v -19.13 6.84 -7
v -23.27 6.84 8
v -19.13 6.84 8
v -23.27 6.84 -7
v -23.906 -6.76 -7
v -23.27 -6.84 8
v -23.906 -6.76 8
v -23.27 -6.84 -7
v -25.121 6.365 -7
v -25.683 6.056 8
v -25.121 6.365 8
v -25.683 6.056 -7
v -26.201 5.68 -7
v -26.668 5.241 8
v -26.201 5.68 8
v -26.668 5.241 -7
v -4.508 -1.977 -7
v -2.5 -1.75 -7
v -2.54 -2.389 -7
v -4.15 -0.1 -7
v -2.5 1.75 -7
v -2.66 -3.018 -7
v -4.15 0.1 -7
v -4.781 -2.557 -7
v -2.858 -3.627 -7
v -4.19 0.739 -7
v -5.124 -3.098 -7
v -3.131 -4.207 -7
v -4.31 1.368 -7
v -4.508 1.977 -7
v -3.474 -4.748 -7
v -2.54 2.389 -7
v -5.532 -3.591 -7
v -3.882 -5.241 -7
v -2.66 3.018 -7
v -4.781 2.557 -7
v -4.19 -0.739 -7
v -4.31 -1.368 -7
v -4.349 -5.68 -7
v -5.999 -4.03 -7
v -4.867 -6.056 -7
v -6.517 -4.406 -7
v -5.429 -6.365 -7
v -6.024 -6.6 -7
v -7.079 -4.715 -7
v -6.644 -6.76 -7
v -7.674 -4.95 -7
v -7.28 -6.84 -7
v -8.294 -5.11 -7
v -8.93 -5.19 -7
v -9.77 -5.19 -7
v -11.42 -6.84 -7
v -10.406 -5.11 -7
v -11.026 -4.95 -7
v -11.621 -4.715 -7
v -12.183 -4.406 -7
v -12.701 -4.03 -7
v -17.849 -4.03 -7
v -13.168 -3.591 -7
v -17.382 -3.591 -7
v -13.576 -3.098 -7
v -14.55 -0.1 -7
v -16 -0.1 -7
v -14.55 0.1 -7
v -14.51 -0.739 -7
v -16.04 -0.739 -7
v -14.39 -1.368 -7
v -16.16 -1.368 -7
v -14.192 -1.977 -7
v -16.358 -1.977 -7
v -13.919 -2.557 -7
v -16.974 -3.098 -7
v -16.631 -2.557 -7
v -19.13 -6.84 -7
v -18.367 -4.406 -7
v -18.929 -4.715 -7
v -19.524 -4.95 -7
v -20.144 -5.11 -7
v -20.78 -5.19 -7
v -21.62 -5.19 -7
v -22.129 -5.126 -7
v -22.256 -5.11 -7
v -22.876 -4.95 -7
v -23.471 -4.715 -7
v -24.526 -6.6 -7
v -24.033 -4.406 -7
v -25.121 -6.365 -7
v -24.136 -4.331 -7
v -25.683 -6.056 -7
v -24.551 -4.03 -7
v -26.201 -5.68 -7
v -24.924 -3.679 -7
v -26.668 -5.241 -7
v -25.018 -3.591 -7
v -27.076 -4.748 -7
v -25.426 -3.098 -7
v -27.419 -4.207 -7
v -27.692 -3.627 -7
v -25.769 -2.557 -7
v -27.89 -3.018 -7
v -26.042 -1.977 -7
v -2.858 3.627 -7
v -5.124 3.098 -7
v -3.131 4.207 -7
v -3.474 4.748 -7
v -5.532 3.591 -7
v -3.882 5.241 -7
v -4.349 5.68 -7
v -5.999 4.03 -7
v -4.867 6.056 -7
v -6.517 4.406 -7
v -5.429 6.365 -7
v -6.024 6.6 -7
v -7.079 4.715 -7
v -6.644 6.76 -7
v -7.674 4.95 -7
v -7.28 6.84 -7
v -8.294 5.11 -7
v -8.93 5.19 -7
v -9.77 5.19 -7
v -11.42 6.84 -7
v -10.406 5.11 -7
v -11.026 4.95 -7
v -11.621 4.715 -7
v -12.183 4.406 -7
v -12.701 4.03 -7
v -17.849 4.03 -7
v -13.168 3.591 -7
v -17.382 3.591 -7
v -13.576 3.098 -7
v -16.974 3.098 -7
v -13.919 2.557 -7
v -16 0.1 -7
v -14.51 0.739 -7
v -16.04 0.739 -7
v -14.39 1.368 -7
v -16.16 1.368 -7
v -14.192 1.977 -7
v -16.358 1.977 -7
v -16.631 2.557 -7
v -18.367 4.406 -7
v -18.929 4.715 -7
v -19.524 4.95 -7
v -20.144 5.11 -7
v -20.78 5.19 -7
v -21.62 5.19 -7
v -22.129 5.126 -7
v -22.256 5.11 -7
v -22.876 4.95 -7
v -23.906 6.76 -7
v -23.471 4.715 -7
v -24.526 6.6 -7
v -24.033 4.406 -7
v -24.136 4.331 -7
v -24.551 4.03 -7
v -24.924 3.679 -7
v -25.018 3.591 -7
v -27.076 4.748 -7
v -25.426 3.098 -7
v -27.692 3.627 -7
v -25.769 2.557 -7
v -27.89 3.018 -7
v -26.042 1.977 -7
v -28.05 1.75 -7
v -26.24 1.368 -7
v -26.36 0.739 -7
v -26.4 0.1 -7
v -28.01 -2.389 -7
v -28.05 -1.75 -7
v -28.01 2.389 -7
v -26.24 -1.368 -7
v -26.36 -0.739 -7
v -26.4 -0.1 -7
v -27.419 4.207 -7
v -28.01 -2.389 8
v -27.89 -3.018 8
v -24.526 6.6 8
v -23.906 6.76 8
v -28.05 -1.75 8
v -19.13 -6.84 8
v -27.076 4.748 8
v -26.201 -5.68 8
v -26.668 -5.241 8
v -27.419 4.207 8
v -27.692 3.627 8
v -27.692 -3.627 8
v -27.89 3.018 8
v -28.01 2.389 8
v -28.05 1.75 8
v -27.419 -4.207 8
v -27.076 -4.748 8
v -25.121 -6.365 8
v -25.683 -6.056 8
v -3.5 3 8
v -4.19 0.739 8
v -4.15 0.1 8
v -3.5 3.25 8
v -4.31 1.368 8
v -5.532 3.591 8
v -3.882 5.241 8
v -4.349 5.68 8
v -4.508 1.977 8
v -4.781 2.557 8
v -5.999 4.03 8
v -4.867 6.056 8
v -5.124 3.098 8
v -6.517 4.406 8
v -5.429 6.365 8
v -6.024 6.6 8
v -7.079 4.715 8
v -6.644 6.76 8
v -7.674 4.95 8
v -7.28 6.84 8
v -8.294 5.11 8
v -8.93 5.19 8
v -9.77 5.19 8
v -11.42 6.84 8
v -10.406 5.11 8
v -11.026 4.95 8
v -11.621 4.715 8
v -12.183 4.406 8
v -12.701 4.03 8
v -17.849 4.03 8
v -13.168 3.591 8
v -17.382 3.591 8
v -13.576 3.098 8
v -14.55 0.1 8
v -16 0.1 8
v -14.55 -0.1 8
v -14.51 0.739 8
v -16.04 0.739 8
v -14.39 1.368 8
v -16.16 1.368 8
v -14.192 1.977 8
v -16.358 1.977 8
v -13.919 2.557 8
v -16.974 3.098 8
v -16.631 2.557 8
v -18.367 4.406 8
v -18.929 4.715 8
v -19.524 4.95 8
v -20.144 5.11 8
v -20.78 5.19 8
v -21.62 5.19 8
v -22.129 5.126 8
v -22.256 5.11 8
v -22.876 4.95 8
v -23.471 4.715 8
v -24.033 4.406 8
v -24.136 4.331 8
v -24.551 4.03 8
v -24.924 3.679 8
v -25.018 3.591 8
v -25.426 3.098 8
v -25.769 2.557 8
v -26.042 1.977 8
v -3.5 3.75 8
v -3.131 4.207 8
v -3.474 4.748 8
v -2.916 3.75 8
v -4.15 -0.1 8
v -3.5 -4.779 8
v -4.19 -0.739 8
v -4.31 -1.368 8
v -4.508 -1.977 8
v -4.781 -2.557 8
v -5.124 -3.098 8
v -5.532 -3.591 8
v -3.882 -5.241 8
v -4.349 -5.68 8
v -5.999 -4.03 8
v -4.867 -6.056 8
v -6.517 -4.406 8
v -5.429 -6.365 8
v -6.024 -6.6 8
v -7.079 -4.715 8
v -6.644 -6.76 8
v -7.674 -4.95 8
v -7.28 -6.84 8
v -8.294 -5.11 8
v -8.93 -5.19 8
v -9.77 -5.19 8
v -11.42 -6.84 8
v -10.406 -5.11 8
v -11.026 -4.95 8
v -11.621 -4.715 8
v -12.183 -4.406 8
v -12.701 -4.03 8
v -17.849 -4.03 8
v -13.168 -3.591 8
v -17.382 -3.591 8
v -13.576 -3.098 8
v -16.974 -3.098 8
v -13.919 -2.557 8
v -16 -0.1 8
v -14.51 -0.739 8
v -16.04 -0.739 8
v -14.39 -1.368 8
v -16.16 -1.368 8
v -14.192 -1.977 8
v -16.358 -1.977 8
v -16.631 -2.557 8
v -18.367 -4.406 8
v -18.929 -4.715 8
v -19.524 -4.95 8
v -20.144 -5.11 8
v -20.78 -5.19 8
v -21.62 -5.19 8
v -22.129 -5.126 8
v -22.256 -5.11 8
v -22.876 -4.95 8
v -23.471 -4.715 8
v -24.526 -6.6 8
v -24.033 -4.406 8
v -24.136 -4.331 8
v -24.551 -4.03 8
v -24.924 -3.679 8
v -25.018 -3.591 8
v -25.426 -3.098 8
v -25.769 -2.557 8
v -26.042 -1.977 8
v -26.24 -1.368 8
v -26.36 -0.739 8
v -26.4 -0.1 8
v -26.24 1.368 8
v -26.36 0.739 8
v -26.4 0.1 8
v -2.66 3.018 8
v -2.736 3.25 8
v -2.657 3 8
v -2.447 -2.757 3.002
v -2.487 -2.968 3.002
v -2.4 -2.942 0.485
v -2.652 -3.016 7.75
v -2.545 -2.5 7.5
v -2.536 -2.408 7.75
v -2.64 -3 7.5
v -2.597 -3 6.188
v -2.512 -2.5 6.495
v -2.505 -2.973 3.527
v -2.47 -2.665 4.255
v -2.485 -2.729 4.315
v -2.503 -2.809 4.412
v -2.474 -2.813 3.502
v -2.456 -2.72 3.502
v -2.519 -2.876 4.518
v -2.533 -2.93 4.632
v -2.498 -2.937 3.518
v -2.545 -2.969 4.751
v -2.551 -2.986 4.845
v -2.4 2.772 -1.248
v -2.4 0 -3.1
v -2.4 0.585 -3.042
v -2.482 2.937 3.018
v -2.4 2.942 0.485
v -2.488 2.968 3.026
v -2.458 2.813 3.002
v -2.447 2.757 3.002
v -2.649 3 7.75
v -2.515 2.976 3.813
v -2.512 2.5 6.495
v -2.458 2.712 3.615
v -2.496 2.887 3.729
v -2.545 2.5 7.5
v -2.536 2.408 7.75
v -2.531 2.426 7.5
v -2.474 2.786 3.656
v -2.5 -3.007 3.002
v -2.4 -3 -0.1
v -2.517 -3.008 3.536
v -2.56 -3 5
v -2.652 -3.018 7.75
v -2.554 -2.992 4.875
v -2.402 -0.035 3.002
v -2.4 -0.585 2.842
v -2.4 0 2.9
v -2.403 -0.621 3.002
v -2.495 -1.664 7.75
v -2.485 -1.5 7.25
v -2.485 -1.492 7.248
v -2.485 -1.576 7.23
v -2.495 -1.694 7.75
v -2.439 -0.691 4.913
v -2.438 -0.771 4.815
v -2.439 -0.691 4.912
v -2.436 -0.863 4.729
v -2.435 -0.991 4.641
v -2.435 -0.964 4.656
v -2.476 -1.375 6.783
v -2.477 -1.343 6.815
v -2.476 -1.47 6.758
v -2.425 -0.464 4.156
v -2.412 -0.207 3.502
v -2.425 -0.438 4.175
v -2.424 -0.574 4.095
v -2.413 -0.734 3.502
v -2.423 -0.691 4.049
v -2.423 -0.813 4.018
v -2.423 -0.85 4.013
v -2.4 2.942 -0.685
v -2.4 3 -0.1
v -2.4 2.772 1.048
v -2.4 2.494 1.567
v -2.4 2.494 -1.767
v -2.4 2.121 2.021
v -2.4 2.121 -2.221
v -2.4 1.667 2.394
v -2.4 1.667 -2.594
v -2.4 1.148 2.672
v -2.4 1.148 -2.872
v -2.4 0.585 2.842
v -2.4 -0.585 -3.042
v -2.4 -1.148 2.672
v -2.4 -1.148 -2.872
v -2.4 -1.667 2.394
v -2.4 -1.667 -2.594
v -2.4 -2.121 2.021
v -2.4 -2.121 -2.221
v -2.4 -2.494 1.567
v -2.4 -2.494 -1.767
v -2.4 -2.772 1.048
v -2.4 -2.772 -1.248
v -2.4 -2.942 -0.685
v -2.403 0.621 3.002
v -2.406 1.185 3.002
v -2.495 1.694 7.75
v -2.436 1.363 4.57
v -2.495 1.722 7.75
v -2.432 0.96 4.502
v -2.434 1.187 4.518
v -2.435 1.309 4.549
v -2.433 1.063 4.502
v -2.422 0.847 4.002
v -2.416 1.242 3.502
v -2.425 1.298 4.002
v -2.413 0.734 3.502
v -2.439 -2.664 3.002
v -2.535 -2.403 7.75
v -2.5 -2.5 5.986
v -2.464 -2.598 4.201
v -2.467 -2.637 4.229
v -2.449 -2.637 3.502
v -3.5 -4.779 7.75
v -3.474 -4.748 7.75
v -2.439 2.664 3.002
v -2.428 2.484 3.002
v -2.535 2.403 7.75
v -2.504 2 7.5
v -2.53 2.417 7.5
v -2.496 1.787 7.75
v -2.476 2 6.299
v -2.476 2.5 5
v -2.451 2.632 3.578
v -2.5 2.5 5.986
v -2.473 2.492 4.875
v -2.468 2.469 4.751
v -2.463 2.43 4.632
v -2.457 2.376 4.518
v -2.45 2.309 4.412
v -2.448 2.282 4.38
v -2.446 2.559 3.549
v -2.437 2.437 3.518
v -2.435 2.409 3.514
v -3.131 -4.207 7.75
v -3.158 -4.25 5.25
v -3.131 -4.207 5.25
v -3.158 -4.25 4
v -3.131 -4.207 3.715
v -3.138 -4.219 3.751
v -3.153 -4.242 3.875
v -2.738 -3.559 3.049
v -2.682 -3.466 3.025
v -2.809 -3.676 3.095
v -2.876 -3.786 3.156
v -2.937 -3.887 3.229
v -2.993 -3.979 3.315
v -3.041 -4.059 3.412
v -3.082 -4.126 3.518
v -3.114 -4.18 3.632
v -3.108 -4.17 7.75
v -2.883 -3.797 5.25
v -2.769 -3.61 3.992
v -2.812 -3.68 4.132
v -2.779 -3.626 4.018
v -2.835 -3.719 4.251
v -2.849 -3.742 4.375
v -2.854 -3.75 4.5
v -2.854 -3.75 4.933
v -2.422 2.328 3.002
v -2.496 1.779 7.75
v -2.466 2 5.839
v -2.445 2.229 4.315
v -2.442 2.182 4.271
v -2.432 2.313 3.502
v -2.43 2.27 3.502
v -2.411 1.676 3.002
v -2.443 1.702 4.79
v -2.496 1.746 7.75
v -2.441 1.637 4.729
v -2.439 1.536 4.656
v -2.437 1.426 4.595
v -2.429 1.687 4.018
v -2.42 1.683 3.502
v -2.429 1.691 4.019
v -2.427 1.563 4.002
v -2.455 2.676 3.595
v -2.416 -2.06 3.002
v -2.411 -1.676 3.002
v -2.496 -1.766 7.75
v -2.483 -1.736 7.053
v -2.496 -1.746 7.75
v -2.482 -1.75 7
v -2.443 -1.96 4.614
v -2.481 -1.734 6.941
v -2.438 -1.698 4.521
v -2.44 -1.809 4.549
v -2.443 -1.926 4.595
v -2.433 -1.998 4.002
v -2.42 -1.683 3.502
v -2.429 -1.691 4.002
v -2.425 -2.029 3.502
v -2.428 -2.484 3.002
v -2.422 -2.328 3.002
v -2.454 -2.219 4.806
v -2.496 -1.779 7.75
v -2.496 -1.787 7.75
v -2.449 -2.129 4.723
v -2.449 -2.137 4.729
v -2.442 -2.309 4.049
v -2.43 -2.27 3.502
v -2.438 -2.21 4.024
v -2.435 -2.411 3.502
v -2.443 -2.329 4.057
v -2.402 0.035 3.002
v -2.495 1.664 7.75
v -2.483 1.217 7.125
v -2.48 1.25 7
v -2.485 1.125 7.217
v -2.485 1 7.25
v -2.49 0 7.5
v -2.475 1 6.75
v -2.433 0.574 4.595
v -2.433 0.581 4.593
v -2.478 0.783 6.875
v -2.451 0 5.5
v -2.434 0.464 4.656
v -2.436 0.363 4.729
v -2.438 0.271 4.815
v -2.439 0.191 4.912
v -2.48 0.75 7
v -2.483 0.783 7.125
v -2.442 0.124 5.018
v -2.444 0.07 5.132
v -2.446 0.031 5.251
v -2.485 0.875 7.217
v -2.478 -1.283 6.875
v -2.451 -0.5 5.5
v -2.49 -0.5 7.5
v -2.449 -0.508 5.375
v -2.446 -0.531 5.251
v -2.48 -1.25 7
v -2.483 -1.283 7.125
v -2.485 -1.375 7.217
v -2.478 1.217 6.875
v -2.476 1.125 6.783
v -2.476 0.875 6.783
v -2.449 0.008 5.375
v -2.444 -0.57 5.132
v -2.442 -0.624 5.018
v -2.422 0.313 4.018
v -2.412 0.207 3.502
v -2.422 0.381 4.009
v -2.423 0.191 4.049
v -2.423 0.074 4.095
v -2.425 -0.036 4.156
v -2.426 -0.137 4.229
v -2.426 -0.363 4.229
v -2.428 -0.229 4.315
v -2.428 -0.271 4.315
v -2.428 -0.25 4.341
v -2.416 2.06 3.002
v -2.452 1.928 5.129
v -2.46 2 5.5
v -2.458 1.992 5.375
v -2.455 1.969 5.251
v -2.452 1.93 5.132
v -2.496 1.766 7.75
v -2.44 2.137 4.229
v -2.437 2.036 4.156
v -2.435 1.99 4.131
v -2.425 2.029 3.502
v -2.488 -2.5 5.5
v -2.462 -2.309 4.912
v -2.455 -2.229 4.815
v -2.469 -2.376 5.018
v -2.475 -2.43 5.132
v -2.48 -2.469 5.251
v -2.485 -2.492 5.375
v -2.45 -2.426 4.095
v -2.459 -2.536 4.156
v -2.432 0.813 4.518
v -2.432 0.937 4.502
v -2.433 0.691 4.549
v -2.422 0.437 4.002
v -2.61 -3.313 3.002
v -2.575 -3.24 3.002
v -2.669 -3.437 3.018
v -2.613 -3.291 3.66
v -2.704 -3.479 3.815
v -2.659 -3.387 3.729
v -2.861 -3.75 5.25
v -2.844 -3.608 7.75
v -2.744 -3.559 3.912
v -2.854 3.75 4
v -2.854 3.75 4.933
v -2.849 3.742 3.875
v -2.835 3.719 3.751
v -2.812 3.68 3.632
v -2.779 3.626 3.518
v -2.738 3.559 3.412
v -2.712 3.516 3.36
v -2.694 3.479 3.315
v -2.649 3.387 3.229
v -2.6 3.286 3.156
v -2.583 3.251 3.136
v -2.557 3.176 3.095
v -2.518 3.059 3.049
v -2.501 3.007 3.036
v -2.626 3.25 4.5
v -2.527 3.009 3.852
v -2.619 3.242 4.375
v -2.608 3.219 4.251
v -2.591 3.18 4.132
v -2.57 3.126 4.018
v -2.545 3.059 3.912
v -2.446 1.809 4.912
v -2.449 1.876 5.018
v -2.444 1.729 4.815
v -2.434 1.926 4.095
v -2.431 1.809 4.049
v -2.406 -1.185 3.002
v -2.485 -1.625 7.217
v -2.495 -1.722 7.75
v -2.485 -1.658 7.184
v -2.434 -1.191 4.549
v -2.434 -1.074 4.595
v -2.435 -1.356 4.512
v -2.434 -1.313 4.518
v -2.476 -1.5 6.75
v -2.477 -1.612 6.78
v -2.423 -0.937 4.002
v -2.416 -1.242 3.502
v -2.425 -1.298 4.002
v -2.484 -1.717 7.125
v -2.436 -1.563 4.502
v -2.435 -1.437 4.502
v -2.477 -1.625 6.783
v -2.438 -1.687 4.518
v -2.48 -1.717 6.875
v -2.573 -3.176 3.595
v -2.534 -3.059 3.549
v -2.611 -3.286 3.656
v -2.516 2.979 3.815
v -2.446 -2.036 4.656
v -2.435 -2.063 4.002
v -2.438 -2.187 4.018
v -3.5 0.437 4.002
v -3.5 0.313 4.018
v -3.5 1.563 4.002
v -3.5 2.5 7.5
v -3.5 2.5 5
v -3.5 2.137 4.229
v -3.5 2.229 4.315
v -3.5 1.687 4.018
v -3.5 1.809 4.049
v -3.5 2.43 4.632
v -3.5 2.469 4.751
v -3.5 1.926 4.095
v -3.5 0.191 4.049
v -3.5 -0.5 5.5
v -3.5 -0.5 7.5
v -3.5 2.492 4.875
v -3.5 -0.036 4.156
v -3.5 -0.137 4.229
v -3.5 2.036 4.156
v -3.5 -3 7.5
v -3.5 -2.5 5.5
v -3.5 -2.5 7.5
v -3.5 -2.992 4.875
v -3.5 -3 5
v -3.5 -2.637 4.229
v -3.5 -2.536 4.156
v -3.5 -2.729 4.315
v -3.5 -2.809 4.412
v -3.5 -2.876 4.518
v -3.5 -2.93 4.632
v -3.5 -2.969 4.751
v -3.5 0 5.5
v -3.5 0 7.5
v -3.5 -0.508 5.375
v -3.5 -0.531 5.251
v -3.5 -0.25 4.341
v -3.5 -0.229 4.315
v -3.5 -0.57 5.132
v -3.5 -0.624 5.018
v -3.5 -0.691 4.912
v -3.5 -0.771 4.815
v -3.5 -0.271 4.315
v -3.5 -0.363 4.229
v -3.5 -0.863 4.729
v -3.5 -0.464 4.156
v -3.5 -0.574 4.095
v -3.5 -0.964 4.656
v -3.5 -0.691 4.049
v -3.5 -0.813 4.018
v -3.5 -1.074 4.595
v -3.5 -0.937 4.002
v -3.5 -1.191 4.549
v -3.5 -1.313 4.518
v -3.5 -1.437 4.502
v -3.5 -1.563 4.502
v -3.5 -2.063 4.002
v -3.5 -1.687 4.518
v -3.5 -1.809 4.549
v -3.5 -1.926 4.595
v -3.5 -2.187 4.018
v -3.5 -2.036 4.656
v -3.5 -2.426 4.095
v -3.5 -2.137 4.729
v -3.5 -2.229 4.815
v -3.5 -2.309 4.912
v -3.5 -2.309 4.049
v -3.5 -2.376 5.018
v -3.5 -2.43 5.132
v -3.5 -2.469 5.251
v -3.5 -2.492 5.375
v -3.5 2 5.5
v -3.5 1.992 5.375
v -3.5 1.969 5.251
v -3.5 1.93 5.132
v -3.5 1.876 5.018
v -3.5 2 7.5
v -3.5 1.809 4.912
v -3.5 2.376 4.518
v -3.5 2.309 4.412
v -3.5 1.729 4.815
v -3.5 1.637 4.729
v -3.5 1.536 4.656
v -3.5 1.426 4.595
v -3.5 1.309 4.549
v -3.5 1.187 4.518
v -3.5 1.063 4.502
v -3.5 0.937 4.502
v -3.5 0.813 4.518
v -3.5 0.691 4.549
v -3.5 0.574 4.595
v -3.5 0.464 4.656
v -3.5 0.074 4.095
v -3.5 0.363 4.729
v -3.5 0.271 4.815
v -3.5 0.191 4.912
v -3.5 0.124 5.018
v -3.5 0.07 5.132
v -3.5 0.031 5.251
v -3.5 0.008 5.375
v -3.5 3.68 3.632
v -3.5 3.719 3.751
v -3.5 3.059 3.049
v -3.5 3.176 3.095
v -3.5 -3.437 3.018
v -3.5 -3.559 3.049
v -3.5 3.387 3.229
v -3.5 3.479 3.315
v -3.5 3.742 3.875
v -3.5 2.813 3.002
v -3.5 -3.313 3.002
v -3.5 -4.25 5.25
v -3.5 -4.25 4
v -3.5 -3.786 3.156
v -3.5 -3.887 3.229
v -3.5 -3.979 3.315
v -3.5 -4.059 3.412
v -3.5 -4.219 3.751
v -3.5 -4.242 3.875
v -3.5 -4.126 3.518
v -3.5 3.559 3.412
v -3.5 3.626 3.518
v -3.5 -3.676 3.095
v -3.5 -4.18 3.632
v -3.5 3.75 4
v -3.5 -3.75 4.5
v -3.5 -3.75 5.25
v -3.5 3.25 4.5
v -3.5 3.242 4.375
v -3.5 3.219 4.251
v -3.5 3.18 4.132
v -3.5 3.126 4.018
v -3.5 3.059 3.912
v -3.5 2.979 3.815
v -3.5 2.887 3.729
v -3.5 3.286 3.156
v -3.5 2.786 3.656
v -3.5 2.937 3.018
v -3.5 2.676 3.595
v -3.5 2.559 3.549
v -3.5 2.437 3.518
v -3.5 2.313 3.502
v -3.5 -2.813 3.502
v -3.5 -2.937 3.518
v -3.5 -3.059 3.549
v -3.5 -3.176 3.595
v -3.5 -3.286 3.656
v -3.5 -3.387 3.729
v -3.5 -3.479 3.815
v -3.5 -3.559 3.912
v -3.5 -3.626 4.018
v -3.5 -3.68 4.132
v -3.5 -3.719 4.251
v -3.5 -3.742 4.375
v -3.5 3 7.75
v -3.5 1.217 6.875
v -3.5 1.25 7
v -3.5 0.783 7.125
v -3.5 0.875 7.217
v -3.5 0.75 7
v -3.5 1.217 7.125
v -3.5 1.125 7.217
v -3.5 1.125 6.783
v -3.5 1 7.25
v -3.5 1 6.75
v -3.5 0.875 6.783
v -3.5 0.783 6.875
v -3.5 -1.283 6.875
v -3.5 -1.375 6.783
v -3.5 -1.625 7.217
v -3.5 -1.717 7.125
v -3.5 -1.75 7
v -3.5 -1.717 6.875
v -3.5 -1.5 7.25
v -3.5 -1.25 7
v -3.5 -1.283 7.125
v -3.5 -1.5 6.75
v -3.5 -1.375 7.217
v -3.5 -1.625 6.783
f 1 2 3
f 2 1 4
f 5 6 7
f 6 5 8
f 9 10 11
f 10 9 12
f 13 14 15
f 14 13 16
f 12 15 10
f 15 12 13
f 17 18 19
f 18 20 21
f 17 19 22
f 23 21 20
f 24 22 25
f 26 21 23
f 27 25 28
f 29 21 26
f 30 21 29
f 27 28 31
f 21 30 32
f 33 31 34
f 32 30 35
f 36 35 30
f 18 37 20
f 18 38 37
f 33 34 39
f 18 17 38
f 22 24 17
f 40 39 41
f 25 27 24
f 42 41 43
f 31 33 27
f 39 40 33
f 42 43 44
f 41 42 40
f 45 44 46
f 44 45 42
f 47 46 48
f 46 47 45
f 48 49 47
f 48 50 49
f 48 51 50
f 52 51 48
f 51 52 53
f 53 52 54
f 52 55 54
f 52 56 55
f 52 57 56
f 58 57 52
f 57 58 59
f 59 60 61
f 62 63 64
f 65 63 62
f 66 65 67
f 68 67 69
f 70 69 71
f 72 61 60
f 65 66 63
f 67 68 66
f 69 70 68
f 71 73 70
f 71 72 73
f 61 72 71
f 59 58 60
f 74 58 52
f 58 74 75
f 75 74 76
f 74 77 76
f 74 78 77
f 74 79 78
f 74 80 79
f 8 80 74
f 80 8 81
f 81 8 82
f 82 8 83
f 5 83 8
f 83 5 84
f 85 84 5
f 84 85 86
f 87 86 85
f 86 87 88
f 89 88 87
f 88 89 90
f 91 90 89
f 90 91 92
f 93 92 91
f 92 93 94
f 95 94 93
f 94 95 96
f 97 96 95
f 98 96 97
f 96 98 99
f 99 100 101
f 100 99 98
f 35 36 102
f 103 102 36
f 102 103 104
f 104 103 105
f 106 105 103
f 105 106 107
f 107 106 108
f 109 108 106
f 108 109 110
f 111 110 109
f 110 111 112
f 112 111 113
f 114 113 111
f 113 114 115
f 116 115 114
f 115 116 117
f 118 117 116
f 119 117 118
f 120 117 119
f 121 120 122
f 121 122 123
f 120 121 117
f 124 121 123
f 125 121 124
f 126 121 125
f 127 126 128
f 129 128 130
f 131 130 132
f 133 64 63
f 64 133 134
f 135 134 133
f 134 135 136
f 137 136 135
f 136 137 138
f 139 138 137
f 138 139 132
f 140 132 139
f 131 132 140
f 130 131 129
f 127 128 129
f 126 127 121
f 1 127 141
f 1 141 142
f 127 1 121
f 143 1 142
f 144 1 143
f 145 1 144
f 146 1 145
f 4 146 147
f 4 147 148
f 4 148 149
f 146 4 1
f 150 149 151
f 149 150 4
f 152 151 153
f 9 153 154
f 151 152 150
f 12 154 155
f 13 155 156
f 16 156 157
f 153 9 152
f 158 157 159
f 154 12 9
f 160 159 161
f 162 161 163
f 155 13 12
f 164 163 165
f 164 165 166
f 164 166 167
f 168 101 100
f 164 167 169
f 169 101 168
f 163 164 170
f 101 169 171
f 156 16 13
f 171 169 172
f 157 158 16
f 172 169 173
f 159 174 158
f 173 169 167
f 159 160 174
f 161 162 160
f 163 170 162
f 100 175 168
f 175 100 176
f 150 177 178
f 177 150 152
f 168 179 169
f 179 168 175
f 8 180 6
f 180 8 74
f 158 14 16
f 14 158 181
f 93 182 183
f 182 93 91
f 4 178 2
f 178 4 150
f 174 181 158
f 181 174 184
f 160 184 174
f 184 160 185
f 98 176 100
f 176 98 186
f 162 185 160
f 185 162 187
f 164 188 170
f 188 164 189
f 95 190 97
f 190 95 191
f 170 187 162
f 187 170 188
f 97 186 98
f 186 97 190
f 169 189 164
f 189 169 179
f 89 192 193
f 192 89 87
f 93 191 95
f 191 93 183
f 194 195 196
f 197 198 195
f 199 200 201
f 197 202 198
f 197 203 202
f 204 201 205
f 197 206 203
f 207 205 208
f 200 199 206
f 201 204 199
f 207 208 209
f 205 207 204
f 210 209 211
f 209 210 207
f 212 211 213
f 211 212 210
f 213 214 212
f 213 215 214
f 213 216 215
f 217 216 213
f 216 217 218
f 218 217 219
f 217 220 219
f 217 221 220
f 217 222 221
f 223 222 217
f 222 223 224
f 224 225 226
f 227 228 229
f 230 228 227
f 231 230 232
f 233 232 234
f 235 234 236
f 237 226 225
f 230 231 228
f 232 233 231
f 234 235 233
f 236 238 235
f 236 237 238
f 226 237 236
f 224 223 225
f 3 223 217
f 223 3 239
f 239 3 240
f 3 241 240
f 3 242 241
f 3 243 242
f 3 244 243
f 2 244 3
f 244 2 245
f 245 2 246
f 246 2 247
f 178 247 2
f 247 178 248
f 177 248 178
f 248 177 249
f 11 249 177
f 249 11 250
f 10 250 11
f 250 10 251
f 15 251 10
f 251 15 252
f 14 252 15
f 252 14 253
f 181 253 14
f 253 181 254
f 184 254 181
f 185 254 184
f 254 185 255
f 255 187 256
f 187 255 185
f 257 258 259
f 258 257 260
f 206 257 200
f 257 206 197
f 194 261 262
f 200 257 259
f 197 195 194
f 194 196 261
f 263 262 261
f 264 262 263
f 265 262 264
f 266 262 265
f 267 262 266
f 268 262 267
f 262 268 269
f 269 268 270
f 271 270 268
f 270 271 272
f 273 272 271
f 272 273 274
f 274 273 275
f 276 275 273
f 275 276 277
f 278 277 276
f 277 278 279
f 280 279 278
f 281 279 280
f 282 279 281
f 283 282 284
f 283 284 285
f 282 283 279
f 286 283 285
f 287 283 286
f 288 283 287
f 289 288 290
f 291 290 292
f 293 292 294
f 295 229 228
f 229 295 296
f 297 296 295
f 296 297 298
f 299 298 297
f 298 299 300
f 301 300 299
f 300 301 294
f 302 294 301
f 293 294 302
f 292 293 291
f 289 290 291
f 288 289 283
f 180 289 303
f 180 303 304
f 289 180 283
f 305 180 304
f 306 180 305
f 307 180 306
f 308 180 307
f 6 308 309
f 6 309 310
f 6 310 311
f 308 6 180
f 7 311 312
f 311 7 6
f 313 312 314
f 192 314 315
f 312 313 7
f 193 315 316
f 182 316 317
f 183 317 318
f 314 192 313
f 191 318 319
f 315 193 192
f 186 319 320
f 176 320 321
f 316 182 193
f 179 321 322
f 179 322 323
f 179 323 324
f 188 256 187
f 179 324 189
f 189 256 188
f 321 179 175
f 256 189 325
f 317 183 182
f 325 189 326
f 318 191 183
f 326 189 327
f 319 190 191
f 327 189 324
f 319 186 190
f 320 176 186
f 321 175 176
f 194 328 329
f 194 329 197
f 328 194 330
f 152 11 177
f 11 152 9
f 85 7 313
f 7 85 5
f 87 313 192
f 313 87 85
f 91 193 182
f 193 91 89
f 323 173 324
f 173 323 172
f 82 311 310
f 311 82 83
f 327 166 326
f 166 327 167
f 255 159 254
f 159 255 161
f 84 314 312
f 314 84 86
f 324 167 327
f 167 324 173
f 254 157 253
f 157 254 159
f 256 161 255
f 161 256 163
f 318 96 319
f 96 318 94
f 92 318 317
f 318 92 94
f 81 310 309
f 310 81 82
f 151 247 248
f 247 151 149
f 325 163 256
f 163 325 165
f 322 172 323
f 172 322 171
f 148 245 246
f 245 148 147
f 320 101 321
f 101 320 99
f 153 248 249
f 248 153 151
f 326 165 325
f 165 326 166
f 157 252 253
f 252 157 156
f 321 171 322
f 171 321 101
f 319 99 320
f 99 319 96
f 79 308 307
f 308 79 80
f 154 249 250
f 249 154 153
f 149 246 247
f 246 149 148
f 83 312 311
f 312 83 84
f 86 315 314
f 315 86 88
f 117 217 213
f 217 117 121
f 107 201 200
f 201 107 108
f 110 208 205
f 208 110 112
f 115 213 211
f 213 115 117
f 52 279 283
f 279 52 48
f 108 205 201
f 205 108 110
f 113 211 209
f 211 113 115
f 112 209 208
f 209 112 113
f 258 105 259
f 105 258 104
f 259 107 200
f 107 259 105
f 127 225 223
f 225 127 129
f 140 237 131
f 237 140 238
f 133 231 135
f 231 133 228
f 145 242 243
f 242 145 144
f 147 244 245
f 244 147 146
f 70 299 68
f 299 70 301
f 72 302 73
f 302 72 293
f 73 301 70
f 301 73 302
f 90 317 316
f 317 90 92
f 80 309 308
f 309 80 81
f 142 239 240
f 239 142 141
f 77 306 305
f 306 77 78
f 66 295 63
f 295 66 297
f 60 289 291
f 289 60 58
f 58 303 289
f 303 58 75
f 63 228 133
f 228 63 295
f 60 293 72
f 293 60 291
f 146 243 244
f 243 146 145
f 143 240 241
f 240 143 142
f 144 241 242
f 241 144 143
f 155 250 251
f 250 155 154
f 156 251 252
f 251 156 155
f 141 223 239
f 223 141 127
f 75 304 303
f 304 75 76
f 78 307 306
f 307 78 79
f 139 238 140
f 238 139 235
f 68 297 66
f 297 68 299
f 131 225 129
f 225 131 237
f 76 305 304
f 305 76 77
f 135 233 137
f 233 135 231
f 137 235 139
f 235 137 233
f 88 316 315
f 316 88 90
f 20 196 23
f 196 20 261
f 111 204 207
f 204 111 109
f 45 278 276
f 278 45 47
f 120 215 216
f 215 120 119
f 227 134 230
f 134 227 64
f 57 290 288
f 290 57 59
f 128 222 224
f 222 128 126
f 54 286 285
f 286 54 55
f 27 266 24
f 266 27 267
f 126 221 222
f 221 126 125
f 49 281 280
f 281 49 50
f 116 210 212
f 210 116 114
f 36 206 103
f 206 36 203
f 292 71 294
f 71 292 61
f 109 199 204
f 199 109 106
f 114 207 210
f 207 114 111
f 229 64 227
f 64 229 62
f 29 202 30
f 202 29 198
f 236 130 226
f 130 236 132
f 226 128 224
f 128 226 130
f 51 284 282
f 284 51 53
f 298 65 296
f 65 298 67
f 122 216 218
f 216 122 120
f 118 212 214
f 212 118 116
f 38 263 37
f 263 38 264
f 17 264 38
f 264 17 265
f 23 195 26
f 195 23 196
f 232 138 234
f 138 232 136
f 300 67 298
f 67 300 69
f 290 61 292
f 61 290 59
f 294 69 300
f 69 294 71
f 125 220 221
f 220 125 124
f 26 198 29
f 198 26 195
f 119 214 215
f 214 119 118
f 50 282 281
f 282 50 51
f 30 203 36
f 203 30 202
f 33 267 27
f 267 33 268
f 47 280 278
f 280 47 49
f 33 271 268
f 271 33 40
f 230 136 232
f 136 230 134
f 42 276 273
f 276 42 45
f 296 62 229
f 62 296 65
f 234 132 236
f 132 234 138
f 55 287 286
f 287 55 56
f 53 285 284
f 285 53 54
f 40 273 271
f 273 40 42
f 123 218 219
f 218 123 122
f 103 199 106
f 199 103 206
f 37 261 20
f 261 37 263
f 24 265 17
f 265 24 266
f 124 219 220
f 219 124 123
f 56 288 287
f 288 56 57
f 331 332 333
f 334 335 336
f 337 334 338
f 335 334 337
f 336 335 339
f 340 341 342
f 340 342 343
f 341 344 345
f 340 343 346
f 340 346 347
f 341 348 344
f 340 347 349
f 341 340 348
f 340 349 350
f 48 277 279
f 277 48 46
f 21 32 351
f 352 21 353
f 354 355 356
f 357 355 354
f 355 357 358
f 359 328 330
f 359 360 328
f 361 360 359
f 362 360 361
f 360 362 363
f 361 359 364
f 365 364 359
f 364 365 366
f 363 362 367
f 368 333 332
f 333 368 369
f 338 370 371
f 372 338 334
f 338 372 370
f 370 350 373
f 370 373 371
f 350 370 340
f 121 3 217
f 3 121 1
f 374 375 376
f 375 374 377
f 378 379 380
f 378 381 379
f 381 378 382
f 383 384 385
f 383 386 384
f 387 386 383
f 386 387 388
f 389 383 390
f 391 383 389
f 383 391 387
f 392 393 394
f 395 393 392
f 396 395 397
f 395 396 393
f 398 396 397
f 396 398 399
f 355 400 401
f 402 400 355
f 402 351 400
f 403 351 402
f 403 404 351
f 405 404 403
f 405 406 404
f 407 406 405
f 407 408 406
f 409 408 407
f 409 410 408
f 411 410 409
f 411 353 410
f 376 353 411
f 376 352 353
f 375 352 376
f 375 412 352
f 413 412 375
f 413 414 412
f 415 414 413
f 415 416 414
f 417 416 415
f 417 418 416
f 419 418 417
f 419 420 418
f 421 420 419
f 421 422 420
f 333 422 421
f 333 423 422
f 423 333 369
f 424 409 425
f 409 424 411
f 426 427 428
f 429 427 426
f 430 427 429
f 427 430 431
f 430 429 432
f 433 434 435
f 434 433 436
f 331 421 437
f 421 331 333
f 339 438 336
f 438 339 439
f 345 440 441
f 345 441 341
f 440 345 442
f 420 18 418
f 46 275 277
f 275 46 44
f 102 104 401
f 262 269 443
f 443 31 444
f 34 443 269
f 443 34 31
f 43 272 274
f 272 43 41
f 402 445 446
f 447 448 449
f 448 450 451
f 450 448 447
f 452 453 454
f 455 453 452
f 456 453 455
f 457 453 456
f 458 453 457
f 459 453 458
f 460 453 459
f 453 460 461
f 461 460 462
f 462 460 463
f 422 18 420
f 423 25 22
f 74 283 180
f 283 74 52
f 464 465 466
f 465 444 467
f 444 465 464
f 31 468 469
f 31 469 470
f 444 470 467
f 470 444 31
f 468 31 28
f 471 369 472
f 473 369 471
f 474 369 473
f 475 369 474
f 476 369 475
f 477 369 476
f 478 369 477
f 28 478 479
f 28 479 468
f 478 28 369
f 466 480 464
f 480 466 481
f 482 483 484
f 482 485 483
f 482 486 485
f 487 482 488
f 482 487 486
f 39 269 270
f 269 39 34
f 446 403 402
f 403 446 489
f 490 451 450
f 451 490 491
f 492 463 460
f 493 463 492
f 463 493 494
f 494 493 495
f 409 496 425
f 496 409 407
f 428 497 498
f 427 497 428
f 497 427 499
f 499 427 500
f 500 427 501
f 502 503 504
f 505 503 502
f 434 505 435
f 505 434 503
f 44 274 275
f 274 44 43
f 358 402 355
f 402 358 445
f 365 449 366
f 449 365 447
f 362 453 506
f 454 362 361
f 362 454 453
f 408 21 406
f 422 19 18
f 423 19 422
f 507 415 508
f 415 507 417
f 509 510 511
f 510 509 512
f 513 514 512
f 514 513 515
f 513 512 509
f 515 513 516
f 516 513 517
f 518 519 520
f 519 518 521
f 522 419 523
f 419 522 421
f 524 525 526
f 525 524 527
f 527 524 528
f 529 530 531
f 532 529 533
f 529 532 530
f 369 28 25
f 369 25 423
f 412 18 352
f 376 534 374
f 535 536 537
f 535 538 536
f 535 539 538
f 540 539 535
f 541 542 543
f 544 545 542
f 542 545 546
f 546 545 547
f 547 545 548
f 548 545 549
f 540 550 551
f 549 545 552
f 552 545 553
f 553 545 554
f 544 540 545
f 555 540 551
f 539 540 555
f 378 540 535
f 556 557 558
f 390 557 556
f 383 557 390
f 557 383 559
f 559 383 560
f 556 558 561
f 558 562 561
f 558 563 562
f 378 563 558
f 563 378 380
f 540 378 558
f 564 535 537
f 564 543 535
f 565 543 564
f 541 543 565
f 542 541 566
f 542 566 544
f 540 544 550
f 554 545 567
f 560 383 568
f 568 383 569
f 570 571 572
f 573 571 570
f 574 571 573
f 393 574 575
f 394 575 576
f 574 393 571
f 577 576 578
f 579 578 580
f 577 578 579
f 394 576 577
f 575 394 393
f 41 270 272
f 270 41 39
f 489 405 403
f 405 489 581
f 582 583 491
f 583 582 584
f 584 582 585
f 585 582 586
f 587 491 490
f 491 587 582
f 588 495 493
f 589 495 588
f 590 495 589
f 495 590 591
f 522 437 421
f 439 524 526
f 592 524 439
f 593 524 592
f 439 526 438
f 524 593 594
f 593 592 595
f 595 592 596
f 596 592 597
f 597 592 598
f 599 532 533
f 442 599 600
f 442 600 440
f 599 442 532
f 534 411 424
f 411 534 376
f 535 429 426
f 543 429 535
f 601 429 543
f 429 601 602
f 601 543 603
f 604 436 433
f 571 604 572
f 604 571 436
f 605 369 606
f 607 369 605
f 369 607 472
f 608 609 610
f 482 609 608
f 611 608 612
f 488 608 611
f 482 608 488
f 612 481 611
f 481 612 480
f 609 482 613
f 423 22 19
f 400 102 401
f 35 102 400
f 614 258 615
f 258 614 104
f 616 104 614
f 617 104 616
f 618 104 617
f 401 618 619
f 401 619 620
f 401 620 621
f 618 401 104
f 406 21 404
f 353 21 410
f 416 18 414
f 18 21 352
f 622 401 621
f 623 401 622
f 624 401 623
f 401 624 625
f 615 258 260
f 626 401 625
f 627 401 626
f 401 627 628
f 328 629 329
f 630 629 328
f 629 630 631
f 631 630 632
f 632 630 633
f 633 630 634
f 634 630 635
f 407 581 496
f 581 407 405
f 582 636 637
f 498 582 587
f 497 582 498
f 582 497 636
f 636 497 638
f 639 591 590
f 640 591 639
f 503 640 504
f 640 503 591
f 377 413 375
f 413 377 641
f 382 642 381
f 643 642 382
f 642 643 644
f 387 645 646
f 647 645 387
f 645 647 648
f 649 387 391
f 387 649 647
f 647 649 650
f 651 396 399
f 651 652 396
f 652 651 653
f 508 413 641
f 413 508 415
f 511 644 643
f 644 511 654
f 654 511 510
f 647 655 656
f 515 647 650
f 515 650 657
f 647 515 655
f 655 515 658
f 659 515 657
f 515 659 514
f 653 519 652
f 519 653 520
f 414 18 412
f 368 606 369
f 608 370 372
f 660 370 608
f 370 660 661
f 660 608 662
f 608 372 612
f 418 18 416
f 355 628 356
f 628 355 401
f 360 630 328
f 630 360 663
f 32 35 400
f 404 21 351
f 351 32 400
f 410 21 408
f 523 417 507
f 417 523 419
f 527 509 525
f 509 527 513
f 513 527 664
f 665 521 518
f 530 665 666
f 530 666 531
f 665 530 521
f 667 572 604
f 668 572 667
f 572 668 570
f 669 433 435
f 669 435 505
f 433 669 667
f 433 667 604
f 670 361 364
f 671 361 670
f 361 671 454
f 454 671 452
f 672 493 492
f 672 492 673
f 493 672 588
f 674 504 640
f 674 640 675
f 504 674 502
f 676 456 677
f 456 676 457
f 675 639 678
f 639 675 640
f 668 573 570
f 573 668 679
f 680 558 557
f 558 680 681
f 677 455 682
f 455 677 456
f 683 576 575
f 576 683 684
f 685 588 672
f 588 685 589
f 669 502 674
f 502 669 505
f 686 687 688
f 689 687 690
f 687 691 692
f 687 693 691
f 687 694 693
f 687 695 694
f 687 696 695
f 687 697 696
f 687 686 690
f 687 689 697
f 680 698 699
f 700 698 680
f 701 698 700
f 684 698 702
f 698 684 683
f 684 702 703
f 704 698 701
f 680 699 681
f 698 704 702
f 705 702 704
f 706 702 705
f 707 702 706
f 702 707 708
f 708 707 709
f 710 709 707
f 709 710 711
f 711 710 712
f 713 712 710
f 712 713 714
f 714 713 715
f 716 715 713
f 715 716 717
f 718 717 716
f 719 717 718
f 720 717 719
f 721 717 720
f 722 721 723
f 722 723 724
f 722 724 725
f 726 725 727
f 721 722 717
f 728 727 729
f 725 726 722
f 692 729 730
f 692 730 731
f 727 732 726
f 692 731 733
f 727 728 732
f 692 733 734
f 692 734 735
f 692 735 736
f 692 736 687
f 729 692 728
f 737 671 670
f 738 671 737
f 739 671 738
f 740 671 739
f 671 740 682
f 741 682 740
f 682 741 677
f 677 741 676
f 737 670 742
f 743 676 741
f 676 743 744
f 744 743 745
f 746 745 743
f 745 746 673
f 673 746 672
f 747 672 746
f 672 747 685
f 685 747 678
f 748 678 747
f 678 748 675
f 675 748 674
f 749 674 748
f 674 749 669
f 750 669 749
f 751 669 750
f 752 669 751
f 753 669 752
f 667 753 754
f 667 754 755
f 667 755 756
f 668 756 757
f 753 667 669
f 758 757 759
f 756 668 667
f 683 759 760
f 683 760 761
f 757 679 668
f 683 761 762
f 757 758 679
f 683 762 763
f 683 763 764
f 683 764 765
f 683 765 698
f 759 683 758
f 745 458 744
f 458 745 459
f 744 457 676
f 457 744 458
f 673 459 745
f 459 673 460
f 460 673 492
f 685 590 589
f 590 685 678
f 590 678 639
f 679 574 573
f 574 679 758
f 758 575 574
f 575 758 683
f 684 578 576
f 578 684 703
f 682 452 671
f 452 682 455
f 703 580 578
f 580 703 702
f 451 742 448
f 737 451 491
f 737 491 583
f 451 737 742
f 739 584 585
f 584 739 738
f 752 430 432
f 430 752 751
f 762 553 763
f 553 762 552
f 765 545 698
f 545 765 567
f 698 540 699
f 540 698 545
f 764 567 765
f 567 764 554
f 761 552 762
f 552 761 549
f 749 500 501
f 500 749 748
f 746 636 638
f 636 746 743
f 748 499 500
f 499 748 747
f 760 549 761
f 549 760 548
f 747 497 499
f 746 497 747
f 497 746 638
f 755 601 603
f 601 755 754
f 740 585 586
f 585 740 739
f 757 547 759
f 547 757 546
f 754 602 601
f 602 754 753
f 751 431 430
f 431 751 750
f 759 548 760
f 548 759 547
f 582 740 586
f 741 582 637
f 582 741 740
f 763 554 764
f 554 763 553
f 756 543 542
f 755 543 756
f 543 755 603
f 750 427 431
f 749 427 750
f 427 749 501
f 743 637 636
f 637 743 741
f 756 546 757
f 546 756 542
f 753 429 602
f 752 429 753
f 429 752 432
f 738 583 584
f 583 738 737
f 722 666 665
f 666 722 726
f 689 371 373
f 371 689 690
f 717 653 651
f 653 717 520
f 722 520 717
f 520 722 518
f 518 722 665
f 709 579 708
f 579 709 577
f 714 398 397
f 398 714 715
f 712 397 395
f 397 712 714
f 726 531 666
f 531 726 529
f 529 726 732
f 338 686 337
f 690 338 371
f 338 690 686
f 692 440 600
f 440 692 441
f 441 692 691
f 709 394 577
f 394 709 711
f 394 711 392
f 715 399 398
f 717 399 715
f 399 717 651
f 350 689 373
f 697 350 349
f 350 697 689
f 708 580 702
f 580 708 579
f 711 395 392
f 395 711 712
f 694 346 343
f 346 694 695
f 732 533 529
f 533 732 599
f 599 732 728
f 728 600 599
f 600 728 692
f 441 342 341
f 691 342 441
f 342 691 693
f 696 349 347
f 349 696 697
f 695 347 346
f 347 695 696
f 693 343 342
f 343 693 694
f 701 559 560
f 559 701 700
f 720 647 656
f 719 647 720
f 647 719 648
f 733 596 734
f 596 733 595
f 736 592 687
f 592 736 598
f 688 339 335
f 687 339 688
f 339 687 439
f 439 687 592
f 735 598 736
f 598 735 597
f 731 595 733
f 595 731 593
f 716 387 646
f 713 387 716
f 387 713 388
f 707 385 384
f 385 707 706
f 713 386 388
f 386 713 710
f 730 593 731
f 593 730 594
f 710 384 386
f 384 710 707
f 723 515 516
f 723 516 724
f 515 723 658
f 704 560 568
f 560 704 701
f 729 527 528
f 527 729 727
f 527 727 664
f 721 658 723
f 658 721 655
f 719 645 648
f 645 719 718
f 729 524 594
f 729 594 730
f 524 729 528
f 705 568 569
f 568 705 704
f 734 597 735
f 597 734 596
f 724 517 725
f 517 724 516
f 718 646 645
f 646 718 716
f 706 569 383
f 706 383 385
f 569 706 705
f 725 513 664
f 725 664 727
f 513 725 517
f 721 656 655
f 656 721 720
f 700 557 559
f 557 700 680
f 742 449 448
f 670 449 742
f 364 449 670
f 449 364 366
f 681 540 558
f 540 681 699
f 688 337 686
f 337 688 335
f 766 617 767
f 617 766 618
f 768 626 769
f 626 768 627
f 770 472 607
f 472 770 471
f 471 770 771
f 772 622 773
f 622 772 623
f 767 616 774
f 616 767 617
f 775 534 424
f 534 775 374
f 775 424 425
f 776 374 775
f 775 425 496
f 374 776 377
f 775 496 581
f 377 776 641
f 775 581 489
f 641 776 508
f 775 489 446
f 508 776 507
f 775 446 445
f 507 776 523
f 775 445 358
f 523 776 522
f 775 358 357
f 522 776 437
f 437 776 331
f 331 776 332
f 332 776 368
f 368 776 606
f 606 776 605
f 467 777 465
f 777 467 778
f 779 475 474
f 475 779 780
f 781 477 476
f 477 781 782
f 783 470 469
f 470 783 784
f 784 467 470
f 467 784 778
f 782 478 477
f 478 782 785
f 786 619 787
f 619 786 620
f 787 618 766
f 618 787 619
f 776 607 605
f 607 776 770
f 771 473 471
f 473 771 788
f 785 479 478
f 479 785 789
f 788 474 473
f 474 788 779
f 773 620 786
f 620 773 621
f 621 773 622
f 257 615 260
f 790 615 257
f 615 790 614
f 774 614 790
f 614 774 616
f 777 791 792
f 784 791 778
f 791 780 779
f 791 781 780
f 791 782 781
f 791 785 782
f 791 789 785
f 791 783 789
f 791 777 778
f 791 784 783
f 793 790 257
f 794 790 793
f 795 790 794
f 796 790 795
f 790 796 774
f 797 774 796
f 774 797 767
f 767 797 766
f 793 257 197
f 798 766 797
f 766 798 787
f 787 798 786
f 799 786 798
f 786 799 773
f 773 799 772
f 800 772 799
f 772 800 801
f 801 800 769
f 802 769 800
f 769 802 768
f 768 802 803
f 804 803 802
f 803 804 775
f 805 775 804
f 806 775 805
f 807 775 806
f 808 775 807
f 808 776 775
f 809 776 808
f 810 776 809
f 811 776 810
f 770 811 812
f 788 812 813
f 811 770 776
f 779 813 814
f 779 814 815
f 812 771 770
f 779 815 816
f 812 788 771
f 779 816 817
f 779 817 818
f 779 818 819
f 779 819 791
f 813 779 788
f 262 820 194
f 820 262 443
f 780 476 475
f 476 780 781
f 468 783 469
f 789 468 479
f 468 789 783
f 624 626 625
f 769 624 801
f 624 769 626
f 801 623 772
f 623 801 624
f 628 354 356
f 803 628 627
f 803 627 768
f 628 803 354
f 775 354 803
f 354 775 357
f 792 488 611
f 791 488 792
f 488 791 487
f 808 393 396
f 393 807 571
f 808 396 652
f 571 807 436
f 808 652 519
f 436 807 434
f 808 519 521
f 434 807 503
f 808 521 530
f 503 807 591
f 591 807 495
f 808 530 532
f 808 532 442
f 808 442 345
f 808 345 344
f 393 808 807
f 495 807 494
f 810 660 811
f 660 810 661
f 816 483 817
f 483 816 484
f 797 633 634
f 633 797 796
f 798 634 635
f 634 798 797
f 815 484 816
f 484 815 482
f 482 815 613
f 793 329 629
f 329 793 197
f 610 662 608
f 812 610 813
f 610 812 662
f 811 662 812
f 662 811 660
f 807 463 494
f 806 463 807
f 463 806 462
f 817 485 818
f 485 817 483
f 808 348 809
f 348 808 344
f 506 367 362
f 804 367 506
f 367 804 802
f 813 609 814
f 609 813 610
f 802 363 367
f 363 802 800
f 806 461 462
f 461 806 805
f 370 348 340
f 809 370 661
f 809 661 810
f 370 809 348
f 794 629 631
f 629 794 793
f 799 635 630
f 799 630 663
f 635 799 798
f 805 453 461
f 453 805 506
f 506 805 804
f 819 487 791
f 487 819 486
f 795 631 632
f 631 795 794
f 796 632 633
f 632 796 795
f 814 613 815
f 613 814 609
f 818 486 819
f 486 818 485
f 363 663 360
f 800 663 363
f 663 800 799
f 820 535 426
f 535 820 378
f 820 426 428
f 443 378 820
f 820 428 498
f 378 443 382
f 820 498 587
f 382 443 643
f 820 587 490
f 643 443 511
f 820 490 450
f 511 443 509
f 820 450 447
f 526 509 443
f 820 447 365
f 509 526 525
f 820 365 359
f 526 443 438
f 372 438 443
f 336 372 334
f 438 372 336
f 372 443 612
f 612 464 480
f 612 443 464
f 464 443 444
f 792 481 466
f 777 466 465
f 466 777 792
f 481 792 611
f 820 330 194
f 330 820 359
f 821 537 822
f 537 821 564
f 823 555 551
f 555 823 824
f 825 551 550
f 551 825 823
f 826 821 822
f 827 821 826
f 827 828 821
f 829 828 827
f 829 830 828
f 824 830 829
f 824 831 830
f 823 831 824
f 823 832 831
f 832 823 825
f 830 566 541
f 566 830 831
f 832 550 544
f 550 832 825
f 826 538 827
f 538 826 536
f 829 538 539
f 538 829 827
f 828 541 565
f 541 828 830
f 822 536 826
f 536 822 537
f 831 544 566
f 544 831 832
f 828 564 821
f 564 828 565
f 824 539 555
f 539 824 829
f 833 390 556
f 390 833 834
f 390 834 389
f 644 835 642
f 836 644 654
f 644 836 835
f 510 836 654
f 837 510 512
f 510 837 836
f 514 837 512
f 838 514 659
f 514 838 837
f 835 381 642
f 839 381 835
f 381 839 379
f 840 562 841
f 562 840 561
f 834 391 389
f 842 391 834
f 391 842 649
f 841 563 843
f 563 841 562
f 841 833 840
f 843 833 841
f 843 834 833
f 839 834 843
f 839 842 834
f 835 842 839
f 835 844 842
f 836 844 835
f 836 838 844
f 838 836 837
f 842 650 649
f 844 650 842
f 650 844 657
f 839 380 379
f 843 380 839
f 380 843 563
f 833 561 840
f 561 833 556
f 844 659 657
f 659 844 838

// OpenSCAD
// file: pin.scad
include <base_dimensions.scad>;

module pin(clip)
{
	rotate([0,0,15])
		#cylinder(r=hole_size/2, h=board_thickness*1.5+epsilon, center=true, $fn=12);

	if (clip) {
		//
		rotate([0,0,90])
		intersection() {
			translate([0, 0, hole_size-epsilon])
				cube([hole_size+2*epsilon, clip_height, 2*hole_size], center=true);

			// [-hole_size/2 - 1.95,0, board_thickness/2]
			translate([0, hole_size/2 + 2, board_thickness/2]) 
				rotate([0, 90, 0])
				rotate_extrude(convexity = 5, $fn=20)
				translate([5, 0, 0])
				 circle(r = (hole_size*0.95)/2); 
			
			translate([0, hole_size/2 + 2 - 1.6, board_thickness/2]) 
				rotate([45,0,0])
				translate([0, -0, hole_size*0.6])
					cube([hole_size+2*epsilon, 3*hole_size, hole_size], center=true);
		}
	}
}

module old_pin(clip)
{
	rotate([0,0,15])
	cylinder(r=hole_size/2, h=board_thickness*1.5+epsilon, center=true, $fn=12);

	if (clip) {
		//
		rotate([0,0,90])
		intersection() {
			translate([0, 0, hole_size-epsilon])
				cube([hole_size+2*epsilon, clip_height, 2*hole_size], center=true);

			// [-hole_size/2 - 1.95,0, board_thickness/2]
			translate([0, hole_size/2 + 2, board_thickness/2]) 
				rotate([0, 90, 0])
				rotate_extrude(convexity = 5, $fn=20)
				translate([5, 0, 0])
				 circle(r = (hole_size*0.95)/2); 
			
			translate([0, hole_size/2 + 2 - 1.6, board_thickness/2]) 
				rotate([45,0,0])
				translate([0, -0, hole_size*0.6])
					cube([hole_size+2*epsilon, 3*hole_size, hole_size], center=true);
		}
	}
}

// examples
//pin(true);
//translate([10,0,0]) pin(false);
// file: round_rect_ex.scad
module round_rect_ex(
	x1, y1,
	x2, y2,
	z,
	r1, r2,
	holder_x_size = 10)
{
	$fn = max(50, min(20, holder_x_size*2));
	brim = z/10;

	//rotate([0,0,(holder_sides==6)?30:((holder_sides==4)?45:0)])
	hull() {
        translate([-x1/2 + r1, y1/2 - r1, z/2-brim/2])
            cylinder(r=r1, h=brim,center=true);
        translate([x1/2 - r1, y1/2 - r1, z/2-brim/2])
            cylinder(r=r1, h=brim,center=true);
        translate([-x1/2 + r1, -y1/2 + r1, z/2-brim/2])
            cylinder(r=r1, h=brim,center=true);
        translate([x1/2 - r1, -y1/2 + r1, z/2-brim/2])
            cylinder(r=r1, h=brim,center=true);

        translate([-x2/2 + r2, y2/2 - r2, -z/2+brim/2])
            cylinder(r=r2, h=brim,center=true);
        translate([x2/2 - r2, y2/2 - r2, -z/2+brim/2])
            cylinder(r=r2, h=brim,center=true);
        translate([-x2/2 + r2, -y2/2 + r2, -z/2+brim/2])
            cylinder(r=r2, h=brim,center=true);
        translate([x2/2 - r2, -y2/2 + r2, -z/2+brim/2])
            cylinder(r=r2, h=brim,center=true);

    }
}

// example
//round_rect_ex(
//	10,20,
//	10,20,
//	10,
//	3,5,
//	50);
// file: pinboard_clips.scad
include <pin.scad>;
include <base_dimensions.scad>;

module pinboard_clips(
	holder_total_x,
	holder_height = 15,
	strength_factor =  0.66)
{
	rotate([0,90,0])
	for(i=[0:round(holder_total_x/hole_spacing)]) {
		for(j=[0:max(strength_factor, round(holder_height/hole_spacing))]) {

			translate([
				j*hole_spacing, 
				-hole_spacing*(round(holder_total_x/hole_spacing)/2) + i*hole_spacing, 
				0])
					pin(j==0);
		}
	}
}

/*
// examples
pinboard_clips(13);

translate([15,0,0])
	pinboard_clips(30,50);

translate([-15,0,0])
	pinboard_clips(30,15,3);
*/
// file: holder.scad
include <base_dimensions.scad>;
include <round_rect_ex.scad>;

module holder(
	negative,
	holder_x_size = 10,
	holder_y_size = 10,
	holder_height = 15,
	wall_thickness = 1.85,
	holder_x_count = 1,
	holder_y_count = 2,
	corner_radius = 30,
	taper_ratio = 1.0,
	holder_offset = 0.0,
	closed_bottom = 0.0,
	holder_cutout_side = 0.0,
	holder_angle = 0.0,
	strength_factor =  0.66)
{
	holder_sides = max(50, min(20, holder_x_size*2));
	holder_total_x = wall_thickness + holder_x_count*(wall_thickness+holder_x_size);
	holder_total_y = wall_thickness + holder_y_count*(wall_thickness+holder_y_size);
	//holder_total_z = round(holder_height/hole_spacing)*hole_spacing;
	holder_roundness = min(corner_radius, holder_x_size/2, holder_y_size/2); 

	for(x=[1:holder_x_count]){
		for(y=[1:holder_y_count]) 
/*		render(convexity=2)*/ {
			translate([
				-holder_total_y /*- (holder_y_size+wall_thickness)/2*/ + y*(holder_y_size+wall_thickness) + wall_thickness,

				-holder_total_x/2 + (holder_x_size+wall_thickness)/2 + (x-1)*(holder_x_size+wall_thickness) + wall_thickness/2,
				 0])			
	{
		rotate([0, holder_angle, 0])
		translate([
			-wall_thickness*abs(sin(holder_angle))-0*abs((holder_y_size/2)*sin(holder_angle))-holder_offset-(holder_y_size + 2*wall_thickness)/2 - board_thickness/2,
			0,
			-(holder_height/2)*sin(holder_angle) - holder_height/2 + clip_height/2
		])
		difference() {
			if (!negative)

				round_rect_ex(
					(holder_y_size + 2*wall_thickness), 
					holder_x_size + 2*wall_thickness, 
					(holder_y_size + 2*wall_thickness)*taper_ratio, 
					(holder_x_size + 2*wall_thickness)*taper_ratio, 
					holder_height, 
					holder_roundness + epsilon, 
					holder_roundness*taper_ratio + epsilon);

				translate([0,0,closed_bottom*wall_thickness])

				if (negative>1) {
					round_rect_ex(
						holder_y_size*taper_ratio, 
						holder_x_size*taper_ratio, 
						holder_y_size*taper_ratio, 
						holder_x_size*taper_ratio, 
						3*max(holder_height, hole_spacing),
						holder_roundness*taper_ratio + epsilon, 
						holder_roundness*taper_ratio + epsilon);
				} else {
					round_rect_ex(
						holder_y_size, 
						holder_x_size, 
						holder_y_size*taper_ratio, 
						holder_x_size*taper_ratio, 
						holder_height+2*epsilon,
						holder_roundness + epsilon, 
						holder_roundness*taper_ratio + epsilon);
				}

			if (!negative)
				if (holder_cutout_side > 0) {

				if (negative>1) {
					hull() {
						scale([1.0, holder_cutout_side, 1.0])
		 					round_rect_ex(
							holder_y_size*taper_ratio, 
							holder_x_size*taper_ratio, 
							holder_y_size*taper_ratio, 
							holder_x_size*taper_ratio, 
							3*max(holder_height, hole_spacing),
							holder_roundness*taper_ratio + epsilon, 
							holder_roundness*taper_ratio + epsilon);
		
						translate([0-(holder_y_size + 2*wall_thickness), 0,0])
						scale([1.0, holder_cutout_side, 1.0])
		 					round_rect_ex(
							holder_y_size*taper_ratio, 
							holder_x_size*taper_ratio, 
							holder_y_size*taper_ratio, 
							holder_x_size*taper_ratio, 
							3*max(holder_height, hole_spacing),
							holder_roundness*taper_ratio + epsilon, 
							holder_roundness*taper_ratio + epsilon);
					}
				} else {
					hull() {
						scale([1.0, holder_cutout_side, 1.0])
		 					round_rect_ex(
							holder_y_size, 
							holder_x_size, 
							holder_y_size*taper_ratio, 
							holder_x_size*taper_ratio, 
							holder_height+2*epsilon,
							holder_roundness + epsilon, 
							holder_roundness*taper_ratio + epsilon);
		
						translate([0-(holder_y_size + 2*wall_thickness), 0,0])
						scale([1.0, holder_cutout_side, 1.0])
		 					round_rect_ex(
							holder_y_size, 
							holder_x_size, 
							holder_y_size*taper_ratio, 
							holder_x_size*taper_ratio, 
							holder_height+2*epsilon,
							holder_roundness + epsilon, 
							holder_roundness*taper_ratio + epsilon);
						}
					}

				}
			}
		} // positioning
	} // for y
	} // for X
}

// Examples
//holder(false,13,13);
// file: pinboard.scad
include <base_dimensions.scad>;

module pinboard(
	clips,
	holder_total_x,
	holder_height = 15,
	wall_thickness = 1.85,
	strength_factor =  0.66)
{
	rotate([0,90,0])
	translate([-epsilon, 0, -wall_thickness - board_thickness/2 + epsilon])
	hull() {
		translate([-clip_height/2 + hole_size/2, 
			-hole_spacing*(round(holder_total_x/hole_spacing)/2),0])
			cylinder(r=hole_size/2, h=wall_thickness);

		translate([-clip_height/2 + hole_size/2, 
			hole_spacing*(round(holder_total_x/hole_spacing)/2),0])
			cylinder(r=hole_size/2,  h=wall_thickness);

		translate([max(strength_factor, round(holder_height/hole_spacing))*hole_spacing,
			-hole_spacing*(round(holder_total_x/hole_spacing)/2),0])
			cylinder(r=hole_size/2, h=wall_thickness);

		translate([max(strength_factor, round(holder_height/hole_spacing))*hole_spacing,
			hole_spacing*(round(holder_total_x/hole_spacing)/2),0])
			cylinder(r=hole_size/2,  h=wall_thickness);

	}
}

// Examples
//pinboard(false,13);
// file: base_dimensions.scad
// dimensions the same outside US?
hole_spacing = 25.4;
hole_size = 6.0035;
board_thickness = 5;

fn = 32;
epsilon = 0.1;
clip_height = 2*hole_size + 2;
$fn = fn;
// main file
// PEGSTR - Pegboard Wizard
// Design by Marius Gheorghescu, November 2014
// Update log:
// November 9th 2014
//		- first coomplete version. Angled holders are often odd/incorrect.
// November 15th 2014
//		- minor tweaks to increase rendering speed. added logo. 
// November 28th 2014
//		- bug fixes

// preview[view:north, tilt:bottom diagonal]

include <base_dimensions.scad>;
include <pinboard.scad>;
include <holder.scad>;
include <pinboard_clips.scad>;

// width of the orifice
holder_x_size = 10;

// depth of the orifice
holder_y_size = 10;

// hight of the holder
holder_height = 15;

// how thick are the walls. Hint: 6*extrusion width produces the best results.
wall_thickness = 1.85;

// how many times to repeat the holder on X axis
holder_x_count = 1;

// how many times to repeat the holder on Y axis
holder_y_count = 2;

// orifice corner radius (roundness). Needs to be less than min(x,y)/2.
corner_radius = 30;

// Use values less than 1.0 to make the bottom of the holder narrow
taper_ratio = 1.0;


/* [Advanced] */

// offset from the peg board, typically 0 unless you have an object that needs clearance
holder_offset = 0.0;

// what ratio of the holders bottom is reinforced to the plate [0.0-1.0]
strength_factor = 0.66;

// for bins: what ratio of wall thickness to use for closing the bottom
closed_bottom = 0.0;

// what percentage cu cut in the front (example to slip in a cable or make the tool snap from the side)
holder_cutout_side = 0.0;

// set an angle for the holder to prevent object from sliding or to view it better from the top
holder_angle = 0.0;


/* [Hidden] */

// what is the $fn parameter
holder_sides = max(50, min(20, holder_x_size*2));

// dimensions the same outside US?
hole_spacing = 25.4;
hole_size = 6;//6.0035;
board_thickness = 5;


holder_total_x = wall_thickness + holder_x_count*(wall_thickness+holder_x_size);
holder_total_y = wall_thickness + holder_y_count*(wall_thickness+holder_y_size);
holder_total_z = round(holder_height/hole_spacing)*hole_spacing;
holder_roundness = min(corner_radius, holder_x_size/2, holder_y_size/2); 


// what is the $fn parameter for holders
$fn = 32;

epsilon = 0.1;

clip_height = 2*hole_size + 2;

module pegstr() 
{
	difference() {
		union() {

			pinboard();

			difference() {
				hull() {
					pinboard();
	
					intersection() {
						translate([-holder_offset - (strength_factor-0.5)*holder_total_y - wall_thickness/4,0,0])
						cube([
							holder_total_y + 2*wall_thickness, 
							holder_total_x + wall_thickness, 
							2*holder_height
						], center=true);
	
						holder(0);
	
					}	
				}

				if (closed_bottom*wall_thickness < epsilon) {
						holder(2);
				}

			}

			//color([0.2,0.5,0])
			difference() {
				holder(0);
				holder(2);
			}

			color([0,0,0])
			pinboard_clips();
		}
	
		holder(1);

		translate([-board_thickness/2,-1,-clip_height+5]) 
		rotate([-90,0,90]) {
			intersection() {
				union() {
					difference() {
						round_rect_ex(3, 10, 3, 10, 2, 1, 1);
						round_rect_ex(2, 9, 2, 9, 3, 1, 1);
					}
			
					translate([2.5, 0, 0]) 
						difference() {
							round_rect_ex(3, 10, 3, 10, 2, 1, 1);
							round_rect_ex(2, 9, 2, 9, 3, 1, 1);
						}
				}
			
				translate([0, -3.5, 0]) 
					cube([20,4,10], center=true);
			}
		
			translate([1.25, -2.5, 0]) 
				difference() {
					round_rect_ex(8, 7, 8, 7, 2, 1, 1);
					round_rect_ex(7, 6, 7, 6, 3, 1, 1);
		
					translate([3,0,0])
						cube([4,2.5,3], center=true);
				}
		
		
			translate([2.0, -1.0, 0]) 
				cube([8, 0.5, 2], center=true);
		
			translate([0,-2,0])
				cylinder(r=0.25, h=2, center=true, $fn=12);
		
			translate([2.5,-2,0])
				cylinder(r=0.25, h=2, center=true, $fn=12);
		}

	}
}


rotate([180,0,0]) pegstr();
